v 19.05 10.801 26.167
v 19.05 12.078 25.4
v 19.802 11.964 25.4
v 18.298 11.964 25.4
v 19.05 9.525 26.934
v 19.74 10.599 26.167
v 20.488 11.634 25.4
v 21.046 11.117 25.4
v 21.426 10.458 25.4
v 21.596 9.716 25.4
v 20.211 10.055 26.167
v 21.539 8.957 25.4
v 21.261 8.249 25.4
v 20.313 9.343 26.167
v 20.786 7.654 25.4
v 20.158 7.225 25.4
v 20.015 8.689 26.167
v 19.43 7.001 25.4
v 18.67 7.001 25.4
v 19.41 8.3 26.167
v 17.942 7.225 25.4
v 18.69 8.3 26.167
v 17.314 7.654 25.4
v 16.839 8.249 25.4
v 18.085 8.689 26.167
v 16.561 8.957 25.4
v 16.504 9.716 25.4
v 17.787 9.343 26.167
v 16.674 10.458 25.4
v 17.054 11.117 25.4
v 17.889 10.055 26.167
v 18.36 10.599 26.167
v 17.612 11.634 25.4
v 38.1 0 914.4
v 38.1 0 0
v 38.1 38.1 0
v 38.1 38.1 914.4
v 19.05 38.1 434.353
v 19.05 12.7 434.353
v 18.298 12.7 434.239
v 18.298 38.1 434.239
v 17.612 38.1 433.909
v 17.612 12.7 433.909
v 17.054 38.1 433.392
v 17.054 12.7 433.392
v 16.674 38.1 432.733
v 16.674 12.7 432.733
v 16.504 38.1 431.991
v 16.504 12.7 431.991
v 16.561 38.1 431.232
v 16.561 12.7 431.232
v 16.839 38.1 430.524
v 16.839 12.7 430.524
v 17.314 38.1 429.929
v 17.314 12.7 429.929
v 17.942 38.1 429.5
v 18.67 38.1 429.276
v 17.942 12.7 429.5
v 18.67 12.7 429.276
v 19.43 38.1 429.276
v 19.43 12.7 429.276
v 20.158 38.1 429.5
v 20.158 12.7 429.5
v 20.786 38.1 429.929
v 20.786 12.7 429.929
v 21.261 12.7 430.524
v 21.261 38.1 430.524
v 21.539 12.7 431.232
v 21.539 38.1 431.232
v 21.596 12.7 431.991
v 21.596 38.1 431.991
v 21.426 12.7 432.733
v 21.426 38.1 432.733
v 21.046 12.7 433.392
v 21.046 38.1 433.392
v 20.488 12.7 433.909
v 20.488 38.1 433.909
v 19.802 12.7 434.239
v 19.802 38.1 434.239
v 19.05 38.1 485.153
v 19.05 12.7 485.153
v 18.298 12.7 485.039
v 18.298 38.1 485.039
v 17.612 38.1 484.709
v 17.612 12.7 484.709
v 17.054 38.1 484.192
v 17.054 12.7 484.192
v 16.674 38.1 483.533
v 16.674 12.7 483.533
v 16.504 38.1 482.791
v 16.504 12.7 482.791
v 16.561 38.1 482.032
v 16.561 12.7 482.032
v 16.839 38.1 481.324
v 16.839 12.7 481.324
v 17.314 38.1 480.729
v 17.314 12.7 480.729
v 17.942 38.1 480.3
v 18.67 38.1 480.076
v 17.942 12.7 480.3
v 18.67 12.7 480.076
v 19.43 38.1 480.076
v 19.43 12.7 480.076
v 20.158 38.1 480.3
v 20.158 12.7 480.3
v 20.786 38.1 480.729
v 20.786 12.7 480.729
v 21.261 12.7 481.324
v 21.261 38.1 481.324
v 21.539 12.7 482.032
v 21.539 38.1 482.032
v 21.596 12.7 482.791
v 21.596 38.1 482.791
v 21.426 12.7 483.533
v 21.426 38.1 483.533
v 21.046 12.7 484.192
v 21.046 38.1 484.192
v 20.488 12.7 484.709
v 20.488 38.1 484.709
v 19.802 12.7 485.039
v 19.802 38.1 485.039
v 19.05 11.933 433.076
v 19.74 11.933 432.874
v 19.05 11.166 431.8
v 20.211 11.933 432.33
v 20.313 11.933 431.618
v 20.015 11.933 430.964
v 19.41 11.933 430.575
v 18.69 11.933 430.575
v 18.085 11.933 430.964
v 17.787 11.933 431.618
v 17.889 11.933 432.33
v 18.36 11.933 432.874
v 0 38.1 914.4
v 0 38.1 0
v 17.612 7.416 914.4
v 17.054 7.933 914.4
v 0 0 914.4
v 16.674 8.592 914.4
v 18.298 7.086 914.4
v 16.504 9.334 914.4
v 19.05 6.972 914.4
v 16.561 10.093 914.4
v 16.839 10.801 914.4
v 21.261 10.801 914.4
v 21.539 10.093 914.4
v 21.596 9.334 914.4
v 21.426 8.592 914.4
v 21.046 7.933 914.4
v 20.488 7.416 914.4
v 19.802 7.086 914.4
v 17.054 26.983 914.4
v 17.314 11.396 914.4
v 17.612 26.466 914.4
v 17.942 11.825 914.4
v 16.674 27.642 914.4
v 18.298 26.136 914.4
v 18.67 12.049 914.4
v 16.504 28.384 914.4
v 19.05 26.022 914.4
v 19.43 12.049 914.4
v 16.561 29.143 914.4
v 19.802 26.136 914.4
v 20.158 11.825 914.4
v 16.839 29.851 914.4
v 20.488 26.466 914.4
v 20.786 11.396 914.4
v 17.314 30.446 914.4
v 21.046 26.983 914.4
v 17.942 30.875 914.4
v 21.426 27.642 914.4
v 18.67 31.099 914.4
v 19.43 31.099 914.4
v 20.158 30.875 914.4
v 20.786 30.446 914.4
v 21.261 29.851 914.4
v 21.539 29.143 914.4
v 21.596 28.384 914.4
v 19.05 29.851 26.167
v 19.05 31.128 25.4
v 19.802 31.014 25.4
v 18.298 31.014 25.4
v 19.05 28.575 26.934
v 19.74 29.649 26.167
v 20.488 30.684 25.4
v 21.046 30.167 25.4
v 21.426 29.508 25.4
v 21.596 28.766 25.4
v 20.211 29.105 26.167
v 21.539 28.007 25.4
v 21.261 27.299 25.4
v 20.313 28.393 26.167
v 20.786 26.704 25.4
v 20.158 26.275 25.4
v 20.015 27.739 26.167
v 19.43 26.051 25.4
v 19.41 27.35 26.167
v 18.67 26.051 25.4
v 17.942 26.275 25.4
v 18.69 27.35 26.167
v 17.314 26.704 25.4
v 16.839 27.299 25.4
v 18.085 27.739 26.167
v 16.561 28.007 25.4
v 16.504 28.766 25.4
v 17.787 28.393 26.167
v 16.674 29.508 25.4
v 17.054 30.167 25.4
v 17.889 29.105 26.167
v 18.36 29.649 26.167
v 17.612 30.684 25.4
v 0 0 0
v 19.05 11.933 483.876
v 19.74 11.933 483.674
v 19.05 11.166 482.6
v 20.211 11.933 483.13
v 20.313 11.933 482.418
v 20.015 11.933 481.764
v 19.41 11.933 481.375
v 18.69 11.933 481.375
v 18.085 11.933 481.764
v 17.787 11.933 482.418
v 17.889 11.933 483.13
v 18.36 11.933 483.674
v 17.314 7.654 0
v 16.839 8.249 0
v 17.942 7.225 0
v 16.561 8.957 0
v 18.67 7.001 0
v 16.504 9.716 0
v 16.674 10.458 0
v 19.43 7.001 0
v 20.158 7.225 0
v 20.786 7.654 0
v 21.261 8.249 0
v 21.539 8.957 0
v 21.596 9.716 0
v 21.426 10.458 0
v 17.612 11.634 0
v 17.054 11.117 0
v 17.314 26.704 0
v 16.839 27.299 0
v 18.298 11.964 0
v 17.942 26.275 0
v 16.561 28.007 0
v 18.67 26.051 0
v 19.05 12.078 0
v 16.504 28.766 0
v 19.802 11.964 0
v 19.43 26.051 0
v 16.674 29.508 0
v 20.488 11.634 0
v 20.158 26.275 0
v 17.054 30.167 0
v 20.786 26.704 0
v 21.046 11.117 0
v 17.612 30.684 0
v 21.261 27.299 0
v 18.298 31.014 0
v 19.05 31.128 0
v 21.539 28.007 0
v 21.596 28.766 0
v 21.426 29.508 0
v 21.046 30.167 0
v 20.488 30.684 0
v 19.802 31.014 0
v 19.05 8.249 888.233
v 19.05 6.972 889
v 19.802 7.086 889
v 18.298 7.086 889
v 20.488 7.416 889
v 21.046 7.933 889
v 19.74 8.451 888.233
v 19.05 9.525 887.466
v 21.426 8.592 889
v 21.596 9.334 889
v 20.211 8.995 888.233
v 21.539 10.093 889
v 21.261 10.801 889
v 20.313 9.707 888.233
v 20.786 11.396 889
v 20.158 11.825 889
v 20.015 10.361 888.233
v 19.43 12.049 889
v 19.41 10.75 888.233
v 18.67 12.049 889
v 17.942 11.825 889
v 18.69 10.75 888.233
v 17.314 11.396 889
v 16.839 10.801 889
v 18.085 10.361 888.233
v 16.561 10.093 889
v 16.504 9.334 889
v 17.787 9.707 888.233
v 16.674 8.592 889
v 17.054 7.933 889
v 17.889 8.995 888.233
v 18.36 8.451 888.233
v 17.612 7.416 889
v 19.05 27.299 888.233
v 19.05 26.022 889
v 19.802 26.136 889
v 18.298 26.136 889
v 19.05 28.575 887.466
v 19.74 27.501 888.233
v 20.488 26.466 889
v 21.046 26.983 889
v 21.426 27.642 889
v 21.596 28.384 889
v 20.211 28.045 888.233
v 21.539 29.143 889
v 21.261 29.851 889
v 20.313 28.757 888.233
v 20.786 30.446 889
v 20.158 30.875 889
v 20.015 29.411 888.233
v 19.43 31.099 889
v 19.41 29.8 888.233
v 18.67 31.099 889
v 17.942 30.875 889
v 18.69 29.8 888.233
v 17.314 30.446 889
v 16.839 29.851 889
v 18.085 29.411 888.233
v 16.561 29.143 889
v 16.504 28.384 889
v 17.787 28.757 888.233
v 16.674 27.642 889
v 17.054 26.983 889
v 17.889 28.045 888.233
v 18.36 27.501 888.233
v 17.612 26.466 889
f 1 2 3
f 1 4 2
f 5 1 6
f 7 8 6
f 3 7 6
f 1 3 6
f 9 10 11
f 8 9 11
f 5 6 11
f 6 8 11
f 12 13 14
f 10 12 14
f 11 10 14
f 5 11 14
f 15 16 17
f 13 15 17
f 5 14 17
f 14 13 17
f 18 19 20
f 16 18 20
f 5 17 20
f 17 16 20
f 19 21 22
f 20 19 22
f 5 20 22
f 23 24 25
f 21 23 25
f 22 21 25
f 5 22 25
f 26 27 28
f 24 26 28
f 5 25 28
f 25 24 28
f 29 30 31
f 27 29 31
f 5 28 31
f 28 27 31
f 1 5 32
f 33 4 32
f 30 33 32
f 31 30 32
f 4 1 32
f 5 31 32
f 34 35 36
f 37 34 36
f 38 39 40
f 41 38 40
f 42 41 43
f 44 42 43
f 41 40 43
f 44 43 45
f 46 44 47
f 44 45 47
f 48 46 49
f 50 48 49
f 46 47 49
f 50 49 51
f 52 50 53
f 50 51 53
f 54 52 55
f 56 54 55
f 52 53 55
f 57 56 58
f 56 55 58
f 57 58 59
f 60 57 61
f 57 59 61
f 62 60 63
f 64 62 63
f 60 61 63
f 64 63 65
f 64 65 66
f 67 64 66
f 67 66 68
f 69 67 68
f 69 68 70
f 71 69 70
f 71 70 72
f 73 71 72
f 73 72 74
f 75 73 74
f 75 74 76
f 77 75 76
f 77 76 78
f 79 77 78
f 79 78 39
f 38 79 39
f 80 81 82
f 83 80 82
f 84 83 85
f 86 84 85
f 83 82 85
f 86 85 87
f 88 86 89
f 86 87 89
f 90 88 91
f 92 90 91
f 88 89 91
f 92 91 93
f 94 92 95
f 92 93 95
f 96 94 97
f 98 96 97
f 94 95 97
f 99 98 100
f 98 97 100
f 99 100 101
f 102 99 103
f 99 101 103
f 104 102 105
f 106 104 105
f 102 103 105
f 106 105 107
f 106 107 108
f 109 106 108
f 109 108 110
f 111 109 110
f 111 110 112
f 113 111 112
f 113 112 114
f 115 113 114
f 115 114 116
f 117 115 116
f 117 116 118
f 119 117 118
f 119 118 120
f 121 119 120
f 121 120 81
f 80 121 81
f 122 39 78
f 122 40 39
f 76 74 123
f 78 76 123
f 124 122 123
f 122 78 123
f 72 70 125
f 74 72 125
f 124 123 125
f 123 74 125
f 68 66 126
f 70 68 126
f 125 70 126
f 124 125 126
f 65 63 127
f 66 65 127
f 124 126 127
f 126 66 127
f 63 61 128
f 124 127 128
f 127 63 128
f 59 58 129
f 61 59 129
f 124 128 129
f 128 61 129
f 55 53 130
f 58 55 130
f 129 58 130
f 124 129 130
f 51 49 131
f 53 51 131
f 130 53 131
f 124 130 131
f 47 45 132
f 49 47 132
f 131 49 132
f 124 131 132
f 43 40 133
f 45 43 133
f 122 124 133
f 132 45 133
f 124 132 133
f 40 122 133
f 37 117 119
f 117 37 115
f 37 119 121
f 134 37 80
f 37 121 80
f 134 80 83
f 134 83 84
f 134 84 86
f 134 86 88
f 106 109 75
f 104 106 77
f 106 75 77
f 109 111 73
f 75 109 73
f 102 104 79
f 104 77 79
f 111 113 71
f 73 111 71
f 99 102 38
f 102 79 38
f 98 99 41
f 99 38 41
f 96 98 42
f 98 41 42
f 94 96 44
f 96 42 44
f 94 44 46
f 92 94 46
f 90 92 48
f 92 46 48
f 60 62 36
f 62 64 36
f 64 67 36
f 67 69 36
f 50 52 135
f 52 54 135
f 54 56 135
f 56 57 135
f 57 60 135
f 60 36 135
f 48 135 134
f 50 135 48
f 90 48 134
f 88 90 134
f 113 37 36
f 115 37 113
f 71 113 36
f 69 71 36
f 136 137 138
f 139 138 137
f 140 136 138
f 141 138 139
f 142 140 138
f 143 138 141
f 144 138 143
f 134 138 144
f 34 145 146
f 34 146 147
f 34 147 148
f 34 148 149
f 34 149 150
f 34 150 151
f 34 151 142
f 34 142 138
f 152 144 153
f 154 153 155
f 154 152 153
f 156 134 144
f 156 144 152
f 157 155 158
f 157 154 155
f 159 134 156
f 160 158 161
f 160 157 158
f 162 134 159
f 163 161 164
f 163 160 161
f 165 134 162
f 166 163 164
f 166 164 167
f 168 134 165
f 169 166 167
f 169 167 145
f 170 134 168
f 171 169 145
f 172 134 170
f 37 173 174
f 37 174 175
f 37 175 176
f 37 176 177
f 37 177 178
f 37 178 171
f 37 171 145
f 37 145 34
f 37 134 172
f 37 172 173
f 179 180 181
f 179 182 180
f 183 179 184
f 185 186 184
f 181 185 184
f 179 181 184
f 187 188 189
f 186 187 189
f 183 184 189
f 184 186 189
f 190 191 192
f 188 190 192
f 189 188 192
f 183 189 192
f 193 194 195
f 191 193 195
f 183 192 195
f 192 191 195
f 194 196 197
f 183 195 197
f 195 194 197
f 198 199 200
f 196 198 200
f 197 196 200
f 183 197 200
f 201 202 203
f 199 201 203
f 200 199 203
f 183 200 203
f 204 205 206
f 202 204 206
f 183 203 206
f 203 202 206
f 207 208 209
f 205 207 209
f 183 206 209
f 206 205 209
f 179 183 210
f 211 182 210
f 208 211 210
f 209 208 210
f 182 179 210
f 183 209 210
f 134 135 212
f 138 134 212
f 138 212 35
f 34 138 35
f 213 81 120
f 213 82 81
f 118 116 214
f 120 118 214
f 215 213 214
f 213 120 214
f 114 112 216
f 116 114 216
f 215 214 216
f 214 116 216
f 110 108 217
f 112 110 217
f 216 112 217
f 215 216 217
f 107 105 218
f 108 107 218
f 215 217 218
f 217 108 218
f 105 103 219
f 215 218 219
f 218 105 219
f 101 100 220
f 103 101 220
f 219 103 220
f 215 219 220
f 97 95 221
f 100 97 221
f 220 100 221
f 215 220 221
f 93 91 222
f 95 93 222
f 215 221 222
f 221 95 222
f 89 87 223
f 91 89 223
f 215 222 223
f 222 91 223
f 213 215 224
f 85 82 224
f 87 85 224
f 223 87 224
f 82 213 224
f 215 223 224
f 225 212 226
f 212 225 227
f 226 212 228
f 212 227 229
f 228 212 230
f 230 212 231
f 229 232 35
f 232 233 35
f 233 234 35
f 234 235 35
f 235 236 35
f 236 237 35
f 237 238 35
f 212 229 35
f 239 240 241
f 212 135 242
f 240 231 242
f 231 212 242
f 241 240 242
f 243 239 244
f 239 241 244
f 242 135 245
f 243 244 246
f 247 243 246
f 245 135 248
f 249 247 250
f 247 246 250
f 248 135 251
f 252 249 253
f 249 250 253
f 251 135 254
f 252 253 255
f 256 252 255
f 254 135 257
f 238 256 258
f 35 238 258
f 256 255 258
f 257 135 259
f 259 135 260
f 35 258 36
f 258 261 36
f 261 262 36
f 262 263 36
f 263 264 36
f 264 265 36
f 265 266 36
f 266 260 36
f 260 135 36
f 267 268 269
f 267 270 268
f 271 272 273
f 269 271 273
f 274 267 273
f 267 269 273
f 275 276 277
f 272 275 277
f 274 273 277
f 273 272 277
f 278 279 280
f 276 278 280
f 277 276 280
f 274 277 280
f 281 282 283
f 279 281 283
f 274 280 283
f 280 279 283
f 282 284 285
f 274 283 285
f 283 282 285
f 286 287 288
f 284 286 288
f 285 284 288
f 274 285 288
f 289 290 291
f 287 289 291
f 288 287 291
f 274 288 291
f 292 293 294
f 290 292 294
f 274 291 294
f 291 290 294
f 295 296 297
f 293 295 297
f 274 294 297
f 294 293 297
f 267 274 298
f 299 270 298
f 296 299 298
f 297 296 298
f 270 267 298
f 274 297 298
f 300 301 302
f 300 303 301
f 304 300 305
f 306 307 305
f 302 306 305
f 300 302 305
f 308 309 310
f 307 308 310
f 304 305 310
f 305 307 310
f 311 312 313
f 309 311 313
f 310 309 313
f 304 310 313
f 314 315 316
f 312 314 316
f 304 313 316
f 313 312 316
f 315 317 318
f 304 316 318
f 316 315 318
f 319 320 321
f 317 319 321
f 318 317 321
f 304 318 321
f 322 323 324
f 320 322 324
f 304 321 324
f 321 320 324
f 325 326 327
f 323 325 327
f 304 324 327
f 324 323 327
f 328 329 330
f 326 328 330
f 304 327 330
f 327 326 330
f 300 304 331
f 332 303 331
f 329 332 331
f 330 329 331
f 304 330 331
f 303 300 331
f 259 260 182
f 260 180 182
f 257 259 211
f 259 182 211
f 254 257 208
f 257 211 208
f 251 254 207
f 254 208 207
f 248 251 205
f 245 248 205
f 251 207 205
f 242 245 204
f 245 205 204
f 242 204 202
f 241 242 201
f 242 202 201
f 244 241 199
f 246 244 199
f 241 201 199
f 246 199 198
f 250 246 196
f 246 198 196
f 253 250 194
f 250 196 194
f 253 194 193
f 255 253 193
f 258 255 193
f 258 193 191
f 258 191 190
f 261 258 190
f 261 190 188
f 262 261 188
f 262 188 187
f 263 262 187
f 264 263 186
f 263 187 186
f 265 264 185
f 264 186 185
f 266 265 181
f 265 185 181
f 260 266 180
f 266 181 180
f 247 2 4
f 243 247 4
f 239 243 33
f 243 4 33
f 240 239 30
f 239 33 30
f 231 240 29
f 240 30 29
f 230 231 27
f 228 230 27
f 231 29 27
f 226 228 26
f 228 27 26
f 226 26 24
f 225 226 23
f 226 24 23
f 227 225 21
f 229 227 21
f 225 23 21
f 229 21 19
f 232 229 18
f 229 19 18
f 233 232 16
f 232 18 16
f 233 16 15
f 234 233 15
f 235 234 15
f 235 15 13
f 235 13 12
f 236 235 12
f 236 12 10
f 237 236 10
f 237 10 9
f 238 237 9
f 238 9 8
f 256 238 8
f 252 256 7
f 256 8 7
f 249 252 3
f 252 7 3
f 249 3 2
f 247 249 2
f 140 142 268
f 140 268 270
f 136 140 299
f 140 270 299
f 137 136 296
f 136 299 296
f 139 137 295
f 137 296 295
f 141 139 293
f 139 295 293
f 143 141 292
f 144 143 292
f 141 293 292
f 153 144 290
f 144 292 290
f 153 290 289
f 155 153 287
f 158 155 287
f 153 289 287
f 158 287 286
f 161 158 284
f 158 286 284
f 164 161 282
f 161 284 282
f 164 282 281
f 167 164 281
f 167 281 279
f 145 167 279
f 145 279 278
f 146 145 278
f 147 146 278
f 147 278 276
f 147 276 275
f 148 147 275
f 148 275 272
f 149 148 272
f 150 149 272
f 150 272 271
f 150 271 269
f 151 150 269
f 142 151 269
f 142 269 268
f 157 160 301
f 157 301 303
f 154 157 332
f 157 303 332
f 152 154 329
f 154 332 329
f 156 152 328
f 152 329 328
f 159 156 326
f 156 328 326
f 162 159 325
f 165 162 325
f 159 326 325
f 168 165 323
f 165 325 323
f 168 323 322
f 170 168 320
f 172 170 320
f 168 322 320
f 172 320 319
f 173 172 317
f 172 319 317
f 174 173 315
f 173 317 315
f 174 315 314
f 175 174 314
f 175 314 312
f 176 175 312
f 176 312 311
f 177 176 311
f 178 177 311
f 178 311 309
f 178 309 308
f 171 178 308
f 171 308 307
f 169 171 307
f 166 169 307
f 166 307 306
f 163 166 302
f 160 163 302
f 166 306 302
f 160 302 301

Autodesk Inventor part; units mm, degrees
ref_plane "YZ Plane" through (0, 0, 0) normal (1, 0, 0) x (0, 1, 0)
ref_plane "XZ Plane" through (0, 0, 0) normal (0, 1, 0) x (-1, 0, 0)
ref_plane "XY Plane" through (0, 0, 0) normal (0, 0, 1) x (1, 0, 0)
sketch "Sketch1" plane through (0, 0, 0) normal (0, 0, 1) x (1, 0, 0)
  line L0 (0, 0) -> (38.1, 0)
  line L1 (38.1, 0) -> (38.1, 38.1)
  line L2 (38.1, 38.1) -> (0, 38.1)
  line L3 (0, 38.1) -> (0, 0)
  dimension "d0" = 38.1
  dimension "d1" = 38.1
extrude "Extrusion1" add sketch "Sketch1" along normal blind 914.4
sketch "Sketch5" plane through (0, 38.1, 0) normal (0, 1, 0) x (1, 0, 0)
  line L0 (0, 0) -> (0, -914.4) projected
  line L1 (38.1, 0) -> (38.1, -914.4) projected
  line L2 (0, -457.2) -> (38.1, -457.2) construction
  circle A0 centre (19.05, -431.8) radius 3.4999
  circle A1 centre (19.05, -482.6) radius 3.4999
  dimension "d51" = 25.4
hole "Hole4" at (19.05, 38.1, 482.6) at (19.05, 38.1, 431.8) direction (0, -1, 0) diameter 5.1054 depth 25.4 tip angle 118 clearance for "Flat Head Machine Screw (82)" size "#10" standard "Ansi Unified Screw Threads"
sketch "Sketch6" plane through (0, 0, 914.4) normal (0, 0, 1) x (1, 0, 0)
  line L0 (38.1, 0) -> (38.1, 38.1) projected
  line L1 (38.1, 38.1) -> (0, 38.1) projected
  line L2 (0, 38.1) -> (0, 0) projected
  circle A0 centre (19.05, 28.575) radius 6.9731
  line L3 (0, 19.05) -> (38.1, 19.05) construction
  circle A1 centre (19.05, 9.525) radius 6.9731
  dimension "d59" = 9.525
hole "Hole5" at (19.05, 28.575, 914.4) at (19.05, 9.525, 914.4) direction (0, 0, -1) diameter 5.1054 depth 25.4 tip angle 118 clearance for "Flat Head Machine Screw (82)" size "#10" standard "Ansi Unified Screw Threads"
sketch "Sketch7" plane through (0, 0, 0) normal (0, 0, -1) x (-1, 0, 0)
  line L0 (0, 38.1) -> (0, 0) projected
  line L1 (-38.1, 38.1) -> (0, 38.1) projected
  line L2 (-38.1, 0) -> (-38.1, 38.1) projected
  circle A0 centre (-19.05, 28.575) radius 2.9201
  line L3 (-38.1, 19.05) -> (0, 19.05) construction
  circle A1 centre (-19.05, 9.525) radius 2.9201
  dimension "d67" = 9.525
hole "Hole6" at (19.05, 28.575, 0) at (19.05, 9.525, 0) direction (0, 0, 1) diameter 5.1054 depth 25.4 tip angle 118 clearance for "Flat Head Machine Screw (82)" size "#10" standard "Ansi Unified Screw Threads"
equation "\"d59\" = 0.25 * d1"
equation "\"d67\" = 0.25 * d1"
properties part number "hubjig_side1" material "Wood (Cherry)"
